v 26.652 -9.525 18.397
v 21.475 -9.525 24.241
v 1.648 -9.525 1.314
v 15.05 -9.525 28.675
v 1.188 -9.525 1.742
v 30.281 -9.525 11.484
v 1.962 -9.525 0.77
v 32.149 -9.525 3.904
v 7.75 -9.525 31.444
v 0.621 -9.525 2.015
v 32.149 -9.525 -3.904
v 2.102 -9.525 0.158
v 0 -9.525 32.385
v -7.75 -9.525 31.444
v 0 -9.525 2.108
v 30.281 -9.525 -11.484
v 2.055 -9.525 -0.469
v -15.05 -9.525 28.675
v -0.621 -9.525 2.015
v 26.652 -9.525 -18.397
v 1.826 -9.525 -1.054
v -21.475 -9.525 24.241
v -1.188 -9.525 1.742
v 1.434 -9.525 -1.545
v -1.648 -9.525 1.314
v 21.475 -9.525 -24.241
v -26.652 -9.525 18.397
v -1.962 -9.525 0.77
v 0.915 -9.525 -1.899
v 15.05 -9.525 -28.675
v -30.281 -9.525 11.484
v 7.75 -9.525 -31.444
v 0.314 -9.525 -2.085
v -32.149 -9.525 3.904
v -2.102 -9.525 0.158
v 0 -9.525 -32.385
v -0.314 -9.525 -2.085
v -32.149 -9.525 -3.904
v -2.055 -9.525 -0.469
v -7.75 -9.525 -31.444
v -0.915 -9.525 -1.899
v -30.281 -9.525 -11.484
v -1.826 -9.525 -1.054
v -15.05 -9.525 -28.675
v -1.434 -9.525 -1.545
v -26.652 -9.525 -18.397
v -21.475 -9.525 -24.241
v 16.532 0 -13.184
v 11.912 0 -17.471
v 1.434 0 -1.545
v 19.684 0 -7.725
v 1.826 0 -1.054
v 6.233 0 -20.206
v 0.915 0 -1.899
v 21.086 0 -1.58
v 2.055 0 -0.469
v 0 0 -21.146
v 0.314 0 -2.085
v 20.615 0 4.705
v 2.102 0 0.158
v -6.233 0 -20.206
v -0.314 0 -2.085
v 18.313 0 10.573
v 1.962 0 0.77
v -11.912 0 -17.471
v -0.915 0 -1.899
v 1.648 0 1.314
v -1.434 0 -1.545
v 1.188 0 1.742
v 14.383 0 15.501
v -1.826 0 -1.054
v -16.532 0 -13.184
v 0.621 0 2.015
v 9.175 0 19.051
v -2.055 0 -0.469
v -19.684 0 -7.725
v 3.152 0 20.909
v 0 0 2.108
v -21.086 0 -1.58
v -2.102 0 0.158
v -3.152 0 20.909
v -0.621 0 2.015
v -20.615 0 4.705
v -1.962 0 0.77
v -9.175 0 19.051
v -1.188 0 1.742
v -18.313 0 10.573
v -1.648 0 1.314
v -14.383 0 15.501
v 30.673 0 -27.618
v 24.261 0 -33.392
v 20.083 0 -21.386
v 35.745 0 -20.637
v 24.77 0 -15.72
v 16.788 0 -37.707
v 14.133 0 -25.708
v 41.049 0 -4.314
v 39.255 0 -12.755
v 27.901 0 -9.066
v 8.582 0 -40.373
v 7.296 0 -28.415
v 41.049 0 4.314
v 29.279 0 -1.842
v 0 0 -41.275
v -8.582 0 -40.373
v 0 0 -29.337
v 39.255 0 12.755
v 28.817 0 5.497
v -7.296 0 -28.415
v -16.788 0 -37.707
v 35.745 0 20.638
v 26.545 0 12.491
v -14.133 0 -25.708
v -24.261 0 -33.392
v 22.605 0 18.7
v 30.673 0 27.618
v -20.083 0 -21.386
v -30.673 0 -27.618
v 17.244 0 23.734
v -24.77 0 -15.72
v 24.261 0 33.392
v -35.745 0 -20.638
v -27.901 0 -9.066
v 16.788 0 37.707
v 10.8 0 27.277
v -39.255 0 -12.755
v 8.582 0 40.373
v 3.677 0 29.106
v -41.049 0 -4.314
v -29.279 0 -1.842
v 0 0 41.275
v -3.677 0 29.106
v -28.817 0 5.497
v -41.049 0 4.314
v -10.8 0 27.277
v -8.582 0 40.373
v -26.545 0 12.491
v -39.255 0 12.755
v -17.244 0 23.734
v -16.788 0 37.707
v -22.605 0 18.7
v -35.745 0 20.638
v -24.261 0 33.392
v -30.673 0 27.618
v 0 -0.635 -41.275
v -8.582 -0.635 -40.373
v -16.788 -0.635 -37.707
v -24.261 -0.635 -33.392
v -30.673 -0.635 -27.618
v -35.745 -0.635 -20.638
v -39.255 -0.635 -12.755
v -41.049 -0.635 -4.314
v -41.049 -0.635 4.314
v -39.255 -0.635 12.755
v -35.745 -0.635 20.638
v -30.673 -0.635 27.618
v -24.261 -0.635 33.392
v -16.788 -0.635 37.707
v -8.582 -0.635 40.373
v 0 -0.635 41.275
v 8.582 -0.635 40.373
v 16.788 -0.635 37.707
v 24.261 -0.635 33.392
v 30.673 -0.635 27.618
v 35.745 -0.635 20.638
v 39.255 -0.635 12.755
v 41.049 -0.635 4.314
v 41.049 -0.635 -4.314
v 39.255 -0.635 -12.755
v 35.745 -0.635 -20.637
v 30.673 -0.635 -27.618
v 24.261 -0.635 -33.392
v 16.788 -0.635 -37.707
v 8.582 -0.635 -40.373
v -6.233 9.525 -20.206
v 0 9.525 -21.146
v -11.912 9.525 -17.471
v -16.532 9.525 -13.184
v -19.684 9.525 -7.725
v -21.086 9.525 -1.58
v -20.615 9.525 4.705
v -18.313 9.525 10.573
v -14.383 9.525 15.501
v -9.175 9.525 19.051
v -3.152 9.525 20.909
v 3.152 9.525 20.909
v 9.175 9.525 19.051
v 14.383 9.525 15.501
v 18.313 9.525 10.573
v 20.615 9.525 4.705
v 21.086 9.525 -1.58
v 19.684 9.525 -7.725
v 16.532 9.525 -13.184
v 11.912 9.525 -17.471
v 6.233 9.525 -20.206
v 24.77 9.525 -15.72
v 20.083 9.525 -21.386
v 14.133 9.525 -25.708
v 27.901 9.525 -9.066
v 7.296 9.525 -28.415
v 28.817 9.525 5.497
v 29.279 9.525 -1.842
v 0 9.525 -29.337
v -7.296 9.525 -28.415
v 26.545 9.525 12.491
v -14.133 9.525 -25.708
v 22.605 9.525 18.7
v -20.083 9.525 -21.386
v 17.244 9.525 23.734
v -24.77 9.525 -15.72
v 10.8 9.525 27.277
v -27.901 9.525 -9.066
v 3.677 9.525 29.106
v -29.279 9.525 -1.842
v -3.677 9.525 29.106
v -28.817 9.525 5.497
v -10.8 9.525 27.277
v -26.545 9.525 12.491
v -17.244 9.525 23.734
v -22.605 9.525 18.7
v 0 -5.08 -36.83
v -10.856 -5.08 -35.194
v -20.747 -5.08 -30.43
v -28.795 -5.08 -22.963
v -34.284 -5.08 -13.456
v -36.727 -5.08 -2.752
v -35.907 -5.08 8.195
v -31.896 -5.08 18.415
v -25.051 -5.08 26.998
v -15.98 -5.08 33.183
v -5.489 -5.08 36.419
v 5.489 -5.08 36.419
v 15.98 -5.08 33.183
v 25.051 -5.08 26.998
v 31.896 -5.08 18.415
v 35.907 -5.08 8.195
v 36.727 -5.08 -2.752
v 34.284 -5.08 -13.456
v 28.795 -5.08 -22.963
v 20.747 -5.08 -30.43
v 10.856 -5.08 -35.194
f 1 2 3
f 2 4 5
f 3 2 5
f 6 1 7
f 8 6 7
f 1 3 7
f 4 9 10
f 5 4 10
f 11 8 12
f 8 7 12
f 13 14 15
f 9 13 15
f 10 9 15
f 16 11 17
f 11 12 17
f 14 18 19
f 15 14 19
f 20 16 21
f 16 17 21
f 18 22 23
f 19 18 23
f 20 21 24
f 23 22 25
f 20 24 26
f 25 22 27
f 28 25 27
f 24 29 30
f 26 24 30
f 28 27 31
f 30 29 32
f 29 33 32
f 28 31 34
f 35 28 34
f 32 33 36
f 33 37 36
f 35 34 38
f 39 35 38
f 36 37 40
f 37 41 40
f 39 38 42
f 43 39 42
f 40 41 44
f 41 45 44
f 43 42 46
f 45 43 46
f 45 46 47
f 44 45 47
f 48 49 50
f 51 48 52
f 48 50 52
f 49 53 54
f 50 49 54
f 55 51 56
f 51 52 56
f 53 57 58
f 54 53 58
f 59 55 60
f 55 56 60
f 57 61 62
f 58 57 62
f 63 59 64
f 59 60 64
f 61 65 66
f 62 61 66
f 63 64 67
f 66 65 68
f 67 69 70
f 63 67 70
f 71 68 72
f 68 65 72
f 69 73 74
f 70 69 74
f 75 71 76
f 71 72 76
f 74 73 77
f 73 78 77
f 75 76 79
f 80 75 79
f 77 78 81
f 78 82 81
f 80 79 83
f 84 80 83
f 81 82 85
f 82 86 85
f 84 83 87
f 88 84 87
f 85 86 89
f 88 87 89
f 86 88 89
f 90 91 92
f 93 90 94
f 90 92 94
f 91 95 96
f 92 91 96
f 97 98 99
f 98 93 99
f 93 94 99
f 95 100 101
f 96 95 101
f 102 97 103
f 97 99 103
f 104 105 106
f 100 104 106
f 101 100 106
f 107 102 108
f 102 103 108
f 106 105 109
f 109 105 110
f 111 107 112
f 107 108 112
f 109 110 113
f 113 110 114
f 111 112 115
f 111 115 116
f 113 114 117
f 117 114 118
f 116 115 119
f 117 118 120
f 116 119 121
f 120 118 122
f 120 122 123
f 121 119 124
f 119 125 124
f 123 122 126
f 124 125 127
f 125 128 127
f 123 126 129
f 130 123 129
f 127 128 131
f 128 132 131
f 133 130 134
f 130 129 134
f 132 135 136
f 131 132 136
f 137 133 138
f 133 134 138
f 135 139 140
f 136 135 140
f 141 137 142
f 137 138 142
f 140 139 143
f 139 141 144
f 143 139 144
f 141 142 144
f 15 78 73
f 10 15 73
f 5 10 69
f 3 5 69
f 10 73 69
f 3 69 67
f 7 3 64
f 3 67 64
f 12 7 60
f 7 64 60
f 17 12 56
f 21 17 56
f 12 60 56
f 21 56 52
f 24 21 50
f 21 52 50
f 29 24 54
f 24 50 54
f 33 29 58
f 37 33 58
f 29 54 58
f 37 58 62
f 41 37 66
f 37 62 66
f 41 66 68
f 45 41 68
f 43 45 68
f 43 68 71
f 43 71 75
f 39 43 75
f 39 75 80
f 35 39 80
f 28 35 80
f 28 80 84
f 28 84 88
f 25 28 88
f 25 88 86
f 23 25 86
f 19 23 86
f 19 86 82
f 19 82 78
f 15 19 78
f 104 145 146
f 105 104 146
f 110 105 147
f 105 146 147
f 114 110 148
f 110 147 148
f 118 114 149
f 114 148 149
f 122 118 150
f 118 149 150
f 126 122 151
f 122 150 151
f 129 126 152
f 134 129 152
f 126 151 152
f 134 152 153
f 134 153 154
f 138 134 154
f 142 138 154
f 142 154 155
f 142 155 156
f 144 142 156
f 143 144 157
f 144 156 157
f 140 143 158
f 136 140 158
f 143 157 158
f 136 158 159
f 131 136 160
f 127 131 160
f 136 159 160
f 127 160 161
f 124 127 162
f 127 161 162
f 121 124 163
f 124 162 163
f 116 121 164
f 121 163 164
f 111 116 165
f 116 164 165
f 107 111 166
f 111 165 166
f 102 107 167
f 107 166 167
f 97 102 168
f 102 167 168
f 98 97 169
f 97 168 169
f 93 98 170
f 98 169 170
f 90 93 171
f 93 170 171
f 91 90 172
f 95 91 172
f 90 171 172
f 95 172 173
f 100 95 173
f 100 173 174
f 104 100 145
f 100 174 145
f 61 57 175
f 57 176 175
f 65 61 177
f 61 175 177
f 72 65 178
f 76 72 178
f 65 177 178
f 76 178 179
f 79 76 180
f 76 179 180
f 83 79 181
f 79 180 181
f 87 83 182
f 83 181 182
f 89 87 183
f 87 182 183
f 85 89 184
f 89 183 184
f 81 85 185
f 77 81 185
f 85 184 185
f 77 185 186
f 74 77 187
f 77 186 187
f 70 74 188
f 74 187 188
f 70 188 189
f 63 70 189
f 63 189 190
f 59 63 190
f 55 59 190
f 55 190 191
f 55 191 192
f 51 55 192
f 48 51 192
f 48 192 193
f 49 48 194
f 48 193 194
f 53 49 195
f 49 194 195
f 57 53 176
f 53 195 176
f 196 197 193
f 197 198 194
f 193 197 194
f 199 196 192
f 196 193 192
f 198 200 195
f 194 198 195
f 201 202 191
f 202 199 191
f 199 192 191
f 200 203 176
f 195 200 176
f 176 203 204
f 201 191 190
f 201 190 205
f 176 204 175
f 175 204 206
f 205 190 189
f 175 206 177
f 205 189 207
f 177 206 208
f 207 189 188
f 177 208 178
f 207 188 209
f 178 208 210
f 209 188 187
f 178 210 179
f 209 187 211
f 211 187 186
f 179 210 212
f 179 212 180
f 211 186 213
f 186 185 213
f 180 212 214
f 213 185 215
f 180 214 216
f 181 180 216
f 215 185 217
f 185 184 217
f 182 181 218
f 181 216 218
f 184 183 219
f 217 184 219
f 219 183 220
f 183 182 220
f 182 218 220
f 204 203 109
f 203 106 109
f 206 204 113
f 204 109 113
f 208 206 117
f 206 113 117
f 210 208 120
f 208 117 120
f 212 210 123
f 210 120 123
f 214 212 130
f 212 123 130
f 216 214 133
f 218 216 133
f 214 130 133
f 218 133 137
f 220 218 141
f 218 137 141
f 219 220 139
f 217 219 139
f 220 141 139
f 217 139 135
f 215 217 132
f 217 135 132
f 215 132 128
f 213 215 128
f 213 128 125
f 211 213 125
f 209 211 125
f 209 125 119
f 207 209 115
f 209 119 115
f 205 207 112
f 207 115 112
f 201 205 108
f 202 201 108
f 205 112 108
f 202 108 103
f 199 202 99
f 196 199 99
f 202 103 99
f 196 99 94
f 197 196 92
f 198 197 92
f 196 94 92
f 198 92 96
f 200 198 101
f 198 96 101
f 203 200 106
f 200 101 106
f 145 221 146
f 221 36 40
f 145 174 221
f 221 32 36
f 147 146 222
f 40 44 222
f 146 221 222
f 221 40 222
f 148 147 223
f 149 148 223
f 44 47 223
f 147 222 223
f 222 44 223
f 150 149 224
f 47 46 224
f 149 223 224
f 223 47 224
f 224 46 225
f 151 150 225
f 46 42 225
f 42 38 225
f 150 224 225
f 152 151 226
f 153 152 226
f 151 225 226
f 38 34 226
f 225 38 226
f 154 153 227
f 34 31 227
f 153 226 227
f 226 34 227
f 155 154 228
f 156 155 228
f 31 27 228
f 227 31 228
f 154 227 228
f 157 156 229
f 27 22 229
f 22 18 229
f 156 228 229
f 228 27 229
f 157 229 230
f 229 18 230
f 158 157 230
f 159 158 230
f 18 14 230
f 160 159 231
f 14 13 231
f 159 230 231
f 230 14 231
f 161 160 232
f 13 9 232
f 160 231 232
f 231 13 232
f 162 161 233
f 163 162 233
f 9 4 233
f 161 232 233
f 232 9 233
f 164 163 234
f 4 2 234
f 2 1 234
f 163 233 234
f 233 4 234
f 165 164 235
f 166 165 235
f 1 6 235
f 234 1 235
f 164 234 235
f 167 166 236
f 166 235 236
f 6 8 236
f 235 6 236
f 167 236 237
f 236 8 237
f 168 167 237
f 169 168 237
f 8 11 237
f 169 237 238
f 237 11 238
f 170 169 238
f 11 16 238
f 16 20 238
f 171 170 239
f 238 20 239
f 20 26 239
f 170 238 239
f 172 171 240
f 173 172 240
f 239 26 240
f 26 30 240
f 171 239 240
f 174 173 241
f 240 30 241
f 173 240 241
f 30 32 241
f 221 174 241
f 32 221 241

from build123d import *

# Parameters (mm, degrees)
CHAMFER1_SIZE               = 8.89
F_19_0_166_DIAMETER_HOLE1_D = 4.2164


with BuildPart() as part:
    # Sketch1 → Revolve1 (revolve)
    with BuildSketch(Plane.XY, mode=Mode.PRIVATE) as revolve1_sk:
        Polygon((-29.337, 0), (-41.275, 0), (-41.275, -9.525), (0, -9.525), (0, 0), (-21.1455, 0), (-21.1455, 9.525), (-29.337, 9.525), align=None)
    revolve(revolve1_sk.sketch.rotate(Axis((0, -9.525, 0), (0, 1, 0)), 270), axis=Axis((0, -9.525, 0), (0, 1, 0)))

    # Chamfer1
    chamfer1_edges = [part.edges().sort_by_distance(p)[0] for p in [
        (0, -9.525, 41.275),
    ]]
    chamfer(chamfer1_edges, length=CHAMFER1_SIZE)

    # #19 (0.166) Diameter Hole1 (through all)
    with Locations(Plane(origin=(0, -9.525, 0), x_dir=(0, 0, -1), z_dir=(0, -1, 0))):
        with Locations((0, 0)):
            Hole(F_19_0_166_DIAMETER_HOLE1_D / 2)


solid = part.part
